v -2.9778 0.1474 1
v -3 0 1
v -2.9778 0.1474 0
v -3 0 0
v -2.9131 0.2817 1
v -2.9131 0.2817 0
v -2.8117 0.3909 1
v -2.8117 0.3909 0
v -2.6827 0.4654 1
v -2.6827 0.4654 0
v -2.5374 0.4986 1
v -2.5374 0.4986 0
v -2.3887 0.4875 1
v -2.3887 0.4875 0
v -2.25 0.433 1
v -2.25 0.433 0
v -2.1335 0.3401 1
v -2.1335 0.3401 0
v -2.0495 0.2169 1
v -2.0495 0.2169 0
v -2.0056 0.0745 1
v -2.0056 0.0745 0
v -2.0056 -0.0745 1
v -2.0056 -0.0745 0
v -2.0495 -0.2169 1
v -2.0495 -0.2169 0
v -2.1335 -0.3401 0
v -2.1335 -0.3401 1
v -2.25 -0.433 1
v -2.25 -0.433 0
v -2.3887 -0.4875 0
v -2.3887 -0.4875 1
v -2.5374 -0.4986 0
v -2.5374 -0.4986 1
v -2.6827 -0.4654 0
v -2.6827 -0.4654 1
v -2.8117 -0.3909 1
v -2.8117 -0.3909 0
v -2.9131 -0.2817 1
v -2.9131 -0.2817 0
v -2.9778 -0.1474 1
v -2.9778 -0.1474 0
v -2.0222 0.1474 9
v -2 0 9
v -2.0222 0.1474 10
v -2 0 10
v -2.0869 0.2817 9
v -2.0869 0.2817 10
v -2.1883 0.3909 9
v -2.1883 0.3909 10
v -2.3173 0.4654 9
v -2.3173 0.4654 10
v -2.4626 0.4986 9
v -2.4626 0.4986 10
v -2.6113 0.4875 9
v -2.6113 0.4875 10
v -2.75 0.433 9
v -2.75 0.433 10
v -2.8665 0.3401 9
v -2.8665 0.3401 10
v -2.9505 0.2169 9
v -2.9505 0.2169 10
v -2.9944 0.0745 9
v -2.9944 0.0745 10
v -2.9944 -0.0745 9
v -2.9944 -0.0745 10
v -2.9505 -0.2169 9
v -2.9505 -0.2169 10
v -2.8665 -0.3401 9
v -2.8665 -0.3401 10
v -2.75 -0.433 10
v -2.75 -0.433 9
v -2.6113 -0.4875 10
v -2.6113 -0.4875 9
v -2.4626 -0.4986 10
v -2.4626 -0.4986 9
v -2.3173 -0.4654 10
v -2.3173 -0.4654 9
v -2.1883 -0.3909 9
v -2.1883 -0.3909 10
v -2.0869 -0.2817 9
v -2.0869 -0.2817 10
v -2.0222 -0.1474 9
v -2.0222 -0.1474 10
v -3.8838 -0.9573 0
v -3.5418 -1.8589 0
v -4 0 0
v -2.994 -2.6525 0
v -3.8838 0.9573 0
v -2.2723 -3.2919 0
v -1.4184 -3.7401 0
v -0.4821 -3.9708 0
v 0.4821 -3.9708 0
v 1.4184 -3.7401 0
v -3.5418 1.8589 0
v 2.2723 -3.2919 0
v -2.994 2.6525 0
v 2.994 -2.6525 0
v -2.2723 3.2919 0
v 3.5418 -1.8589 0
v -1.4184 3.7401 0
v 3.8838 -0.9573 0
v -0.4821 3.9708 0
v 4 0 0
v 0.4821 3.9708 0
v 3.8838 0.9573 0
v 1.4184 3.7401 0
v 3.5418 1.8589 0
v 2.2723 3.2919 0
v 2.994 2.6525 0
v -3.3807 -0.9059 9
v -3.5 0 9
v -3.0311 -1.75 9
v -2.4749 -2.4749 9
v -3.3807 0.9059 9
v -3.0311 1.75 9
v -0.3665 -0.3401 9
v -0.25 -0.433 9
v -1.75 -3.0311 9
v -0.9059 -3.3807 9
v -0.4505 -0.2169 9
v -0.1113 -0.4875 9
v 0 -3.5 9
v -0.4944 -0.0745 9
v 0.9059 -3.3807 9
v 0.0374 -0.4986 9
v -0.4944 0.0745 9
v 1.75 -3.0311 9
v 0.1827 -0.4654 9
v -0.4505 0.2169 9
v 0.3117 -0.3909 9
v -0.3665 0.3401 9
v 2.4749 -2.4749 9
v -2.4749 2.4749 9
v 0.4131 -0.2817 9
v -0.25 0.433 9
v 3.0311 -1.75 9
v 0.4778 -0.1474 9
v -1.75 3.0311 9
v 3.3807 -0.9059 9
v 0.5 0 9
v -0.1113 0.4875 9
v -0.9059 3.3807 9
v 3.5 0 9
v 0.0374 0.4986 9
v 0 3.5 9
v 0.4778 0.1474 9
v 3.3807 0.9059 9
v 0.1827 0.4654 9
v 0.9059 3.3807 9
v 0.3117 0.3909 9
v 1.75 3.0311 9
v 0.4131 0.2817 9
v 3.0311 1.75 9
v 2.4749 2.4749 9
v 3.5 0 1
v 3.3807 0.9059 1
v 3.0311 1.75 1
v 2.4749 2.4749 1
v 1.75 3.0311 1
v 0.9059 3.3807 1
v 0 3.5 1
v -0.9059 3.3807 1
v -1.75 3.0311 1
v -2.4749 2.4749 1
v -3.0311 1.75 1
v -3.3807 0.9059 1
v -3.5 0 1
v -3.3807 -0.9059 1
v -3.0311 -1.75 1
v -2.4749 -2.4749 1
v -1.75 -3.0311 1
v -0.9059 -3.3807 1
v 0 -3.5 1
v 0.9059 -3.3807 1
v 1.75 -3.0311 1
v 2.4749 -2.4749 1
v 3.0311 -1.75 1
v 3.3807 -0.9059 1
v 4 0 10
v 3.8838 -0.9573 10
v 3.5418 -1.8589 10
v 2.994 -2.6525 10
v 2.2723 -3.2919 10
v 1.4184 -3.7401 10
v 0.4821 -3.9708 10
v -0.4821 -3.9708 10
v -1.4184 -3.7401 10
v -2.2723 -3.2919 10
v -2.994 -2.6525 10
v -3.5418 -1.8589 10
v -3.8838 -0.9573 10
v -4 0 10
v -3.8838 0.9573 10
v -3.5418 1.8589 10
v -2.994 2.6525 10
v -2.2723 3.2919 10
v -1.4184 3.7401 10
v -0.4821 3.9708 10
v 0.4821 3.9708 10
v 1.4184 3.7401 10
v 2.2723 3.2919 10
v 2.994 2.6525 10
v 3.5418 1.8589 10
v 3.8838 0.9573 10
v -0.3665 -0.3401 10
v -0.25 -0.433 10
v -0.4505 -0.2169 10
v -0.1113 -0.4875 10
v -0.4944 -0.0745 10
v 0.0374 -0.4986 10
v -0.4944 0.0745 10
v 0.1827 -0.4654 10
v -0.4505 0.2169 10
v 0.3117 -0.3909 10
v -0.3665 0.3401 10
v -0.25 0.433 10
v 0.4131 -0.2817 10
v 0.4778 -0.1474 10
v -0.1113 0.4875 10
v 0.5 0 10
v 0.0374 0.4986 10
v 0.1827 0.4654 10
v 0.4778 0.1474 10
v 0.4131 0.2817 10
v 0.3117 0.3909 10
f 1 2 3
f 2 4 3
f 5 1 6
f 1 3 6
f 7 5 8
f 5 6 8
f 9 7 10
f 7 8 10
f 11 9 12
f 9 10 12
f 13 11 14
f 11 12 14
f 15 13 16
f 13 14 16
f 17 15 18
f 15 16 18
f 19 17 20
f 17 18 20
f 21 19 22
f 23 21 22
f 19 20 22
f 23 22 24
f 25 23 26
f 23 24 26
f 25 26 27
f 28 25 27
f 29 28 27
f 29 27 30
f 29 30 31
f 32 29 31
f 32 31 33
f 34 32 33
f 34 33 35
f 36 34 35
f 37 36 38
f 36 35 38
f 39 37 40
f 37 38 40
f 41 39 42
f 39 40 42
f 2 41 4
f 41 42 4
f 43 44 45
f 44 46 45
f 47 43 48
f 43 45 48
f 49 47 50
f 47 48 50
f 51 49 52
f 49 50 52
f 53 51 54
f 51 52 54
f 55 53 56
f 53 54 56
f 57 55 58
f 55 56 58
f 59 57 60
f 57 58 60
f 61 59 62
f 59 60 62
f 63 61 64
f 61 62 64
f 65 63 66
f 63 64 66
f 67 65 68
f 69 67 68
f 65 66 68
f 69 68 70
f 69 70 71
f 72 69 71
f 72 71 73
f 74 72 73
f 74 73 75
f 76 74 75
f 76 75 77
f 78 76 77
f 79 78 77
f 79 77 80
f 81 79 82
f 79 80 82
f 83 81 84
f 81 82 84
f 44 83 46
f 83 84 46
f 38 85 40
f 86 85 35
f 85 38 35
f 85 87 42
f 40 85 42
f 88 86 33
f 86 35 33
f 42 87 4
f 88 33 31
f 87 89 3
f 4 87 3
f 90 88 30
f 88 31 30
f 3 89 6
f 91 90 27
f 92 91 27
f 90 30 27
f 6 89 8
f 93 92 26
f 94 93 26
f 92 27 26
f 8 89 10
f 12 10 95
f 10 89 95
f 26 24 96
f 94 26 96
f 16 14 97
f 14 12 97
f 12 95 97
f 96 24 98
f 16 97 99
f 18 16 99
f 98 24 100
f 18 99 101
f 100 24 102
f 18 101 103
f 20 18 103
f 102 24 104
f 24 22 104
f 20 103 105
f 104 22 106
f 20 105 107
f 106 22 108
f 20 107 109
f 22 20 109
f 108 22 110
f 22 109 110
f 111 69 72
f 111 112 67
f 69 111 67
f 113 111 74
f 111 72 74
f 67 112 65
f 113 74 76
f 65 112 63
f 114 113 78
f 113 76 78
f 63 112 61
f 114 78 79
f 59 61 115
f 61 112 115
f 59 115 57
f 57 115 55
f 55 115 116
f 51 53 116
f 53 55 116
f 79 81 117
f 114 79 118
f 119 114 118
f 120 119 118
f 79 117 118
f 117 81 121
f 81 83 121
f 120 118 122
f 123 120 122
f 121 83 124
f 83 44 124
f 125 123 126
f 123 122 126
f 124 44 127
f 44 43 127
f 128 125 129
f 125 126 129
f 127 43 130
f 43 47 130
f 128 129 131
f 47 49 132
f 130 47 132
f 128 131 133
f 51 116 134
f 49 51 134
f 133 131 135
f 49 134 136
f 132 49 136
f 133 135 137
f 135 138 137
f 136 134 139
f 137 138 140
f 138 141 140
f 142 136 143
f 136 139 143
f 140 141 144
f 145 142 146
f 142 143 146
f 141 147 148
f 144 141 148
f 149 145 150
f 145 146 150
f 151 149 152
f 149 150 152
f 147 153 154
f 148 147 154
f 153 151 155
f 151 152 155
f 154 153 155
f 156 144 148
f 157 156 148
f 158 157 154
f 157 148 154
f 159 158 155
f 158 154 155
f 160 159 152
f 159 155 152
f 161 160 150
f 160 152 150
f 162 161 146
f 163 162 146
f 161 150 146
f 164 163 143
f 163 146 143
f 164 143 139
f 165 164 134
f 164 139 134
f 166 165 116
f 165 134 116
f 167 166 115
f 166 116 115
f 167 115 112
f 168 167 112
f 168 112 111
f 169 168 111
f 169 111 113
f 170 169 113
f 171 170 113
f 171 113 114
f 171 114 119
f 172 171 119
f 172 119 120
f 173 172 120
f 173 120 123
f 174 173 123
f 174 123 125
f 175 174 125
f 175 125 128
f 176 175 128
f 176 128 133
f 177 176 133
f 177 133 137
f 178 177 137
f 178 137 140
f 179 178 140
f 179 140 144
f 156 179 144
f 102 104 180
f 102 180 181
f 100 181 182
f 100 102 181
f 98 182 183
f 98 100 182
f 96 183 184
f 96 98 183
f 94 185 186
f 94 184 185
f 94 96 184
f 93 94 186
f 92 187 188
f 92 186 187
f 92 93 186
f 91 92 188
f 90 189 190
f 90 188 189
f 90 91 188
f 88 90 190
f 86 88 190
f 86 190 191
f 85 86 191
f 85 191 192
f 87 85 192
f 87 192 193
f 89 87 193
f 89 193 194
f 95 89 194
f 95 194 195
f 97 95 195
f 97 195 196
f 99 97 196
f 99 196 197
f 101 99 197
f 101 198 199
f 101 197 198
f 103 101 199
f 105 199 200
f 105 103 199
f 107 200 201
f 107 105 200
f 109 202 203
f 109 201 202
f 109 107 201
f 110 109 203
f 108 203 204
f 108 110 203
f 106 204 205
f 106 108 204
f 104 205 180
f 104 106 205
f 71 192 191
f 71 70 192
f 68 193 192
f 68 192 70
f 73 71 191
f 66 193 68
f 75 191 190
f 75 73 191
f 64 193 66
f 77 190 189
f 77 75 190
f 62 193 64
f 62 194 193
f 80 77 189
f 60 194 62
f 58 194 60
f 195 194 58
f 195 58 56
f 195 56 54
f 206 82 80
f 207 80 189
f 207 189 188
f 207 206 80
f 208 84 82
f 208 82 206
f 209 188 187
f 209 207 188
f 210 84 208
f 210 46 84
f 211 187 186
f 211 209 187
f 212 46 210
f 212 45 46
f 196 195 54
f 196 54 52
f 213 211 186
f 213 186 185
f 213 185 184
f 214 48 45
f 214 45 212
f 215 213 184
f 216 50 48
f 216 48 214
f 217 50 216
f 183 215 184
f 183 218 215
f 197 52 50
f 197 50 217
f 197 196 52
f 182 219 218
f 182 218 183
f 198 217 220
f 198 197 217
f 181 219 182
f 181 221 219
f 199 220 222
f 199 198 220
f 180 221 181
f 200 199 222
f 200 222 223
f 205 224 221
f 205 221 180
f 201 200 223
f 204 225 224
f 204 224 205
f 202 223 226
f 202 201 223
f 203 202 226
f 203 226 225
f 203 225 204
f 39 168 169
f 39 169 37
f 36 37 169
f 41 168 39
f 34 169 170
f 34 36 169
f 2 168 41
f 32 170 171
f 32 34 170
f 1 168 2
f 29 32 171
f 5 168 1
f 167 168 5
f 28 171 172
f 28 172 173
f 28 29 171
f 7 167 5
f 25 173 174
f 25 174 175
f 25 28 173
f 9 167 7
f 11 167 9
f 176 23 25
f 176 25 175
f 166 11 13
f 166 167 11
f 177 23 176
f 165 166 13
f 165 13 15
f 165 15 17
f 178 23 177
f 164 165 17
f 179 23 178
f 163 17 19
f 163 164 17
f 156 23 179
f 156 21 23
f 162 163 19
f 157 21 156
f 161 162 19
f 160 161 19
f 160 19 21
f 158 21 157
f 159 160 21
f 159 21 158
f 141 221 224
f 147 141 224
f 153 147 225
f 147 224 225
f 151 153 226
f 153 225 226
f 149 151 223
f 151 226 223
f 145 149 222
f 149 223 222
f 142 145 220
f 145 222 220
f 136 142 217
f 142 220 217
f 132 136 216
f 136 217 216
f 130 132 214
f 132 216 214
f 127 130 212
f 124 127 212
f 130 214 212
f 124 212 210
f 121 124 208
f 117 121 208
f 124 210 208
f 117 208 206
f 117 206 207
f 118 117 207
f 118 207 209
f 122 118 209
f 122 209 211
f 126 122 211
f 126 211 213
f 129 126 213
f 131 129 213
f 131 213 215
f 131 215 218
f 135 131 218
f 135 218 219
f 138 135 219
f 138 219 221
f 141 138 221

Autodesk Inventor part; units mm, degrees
ref_plane "YZ Plane" through (0, 0, 0) normal (1, 0, 0) x (0, 1, 0)
ref_plane "XZ Plane" through (0, 0, 0) normal (0, 1, 0) x (-1, 0, 0)
ref_plane "XY Plane" through (0, 0, 0) normal (0, 0, 1) x (1, 0, 0)
sketch "Skizze1" plane through (0, 0, 0) normal (0, 0, 1) x (1, 0, 0)
  circle A0 centre (0, 0) radius 4
  dimension "d0" = 8
extrude "Extrusion1" add sketch "Skizze1" along normal blind 10
sketch "Skizze2" plane through (0, 0, 10) normal (0, 0, 1) x (1, 0, 0)
  circle A0 centre (0, 0) radius 3.5
  dimension "d3" = 7
extrude "Extrusion2" cut sketch "Skizze2" against normal blind 9
sketch "Skizze3" plane through (0, 0, 10) normal (0, 0, 1) x (1, 0, 0)
  circle A0 centre (0, 0) radius 3.5
extrude "Extrusion3" add sketch "Skizze3" against normal blind 1
sketch "Skizze4" plane through (0, 0, 10) normal (0, 0, 1) x (1, 0, 0)
  circle A0 centre (0, 0) radius 0.5
  dimension "d8" = 1
extrude "Extrusion4" cut sketch "Skizze4" against normal blind 1
sketch "Skizze5" plane through (0, 0, 10) normal (0, 0, 1) x (1, 0, 0)
  circle A0 centre (-2.5, 0) radius 0.5
  circle A1 centre (0, 0) radius 4 projected
  line L0 (-5.6, 0) -> (5.6, 0) projected
  dimension "d11" = 1
  dimension "d12" = 2.5
  dimension "d13" = 0
extrude "Extrusion5" cut sketch "Skizze5" against normal blind 1 contours L0 A0 | A0 L0
sketch "Skizze6" plane through (0, 0, 0) normal (0, 0, -1) x (-1, 0, 0)
  circle A0 centre (2.5, 0) radius 0.5
  line L0 (5.6, 0) -> (-5.6, 0) projected
  point P0 (0, 0)
  dimension "d16" = 1
  dimension "d17" = 2.5
  dimension "d18" = 0
extrude "Extrusion6" cut sketch "Skizze6" against normal blind 1
properties part number "Pneumatickolben_Zylinder"
